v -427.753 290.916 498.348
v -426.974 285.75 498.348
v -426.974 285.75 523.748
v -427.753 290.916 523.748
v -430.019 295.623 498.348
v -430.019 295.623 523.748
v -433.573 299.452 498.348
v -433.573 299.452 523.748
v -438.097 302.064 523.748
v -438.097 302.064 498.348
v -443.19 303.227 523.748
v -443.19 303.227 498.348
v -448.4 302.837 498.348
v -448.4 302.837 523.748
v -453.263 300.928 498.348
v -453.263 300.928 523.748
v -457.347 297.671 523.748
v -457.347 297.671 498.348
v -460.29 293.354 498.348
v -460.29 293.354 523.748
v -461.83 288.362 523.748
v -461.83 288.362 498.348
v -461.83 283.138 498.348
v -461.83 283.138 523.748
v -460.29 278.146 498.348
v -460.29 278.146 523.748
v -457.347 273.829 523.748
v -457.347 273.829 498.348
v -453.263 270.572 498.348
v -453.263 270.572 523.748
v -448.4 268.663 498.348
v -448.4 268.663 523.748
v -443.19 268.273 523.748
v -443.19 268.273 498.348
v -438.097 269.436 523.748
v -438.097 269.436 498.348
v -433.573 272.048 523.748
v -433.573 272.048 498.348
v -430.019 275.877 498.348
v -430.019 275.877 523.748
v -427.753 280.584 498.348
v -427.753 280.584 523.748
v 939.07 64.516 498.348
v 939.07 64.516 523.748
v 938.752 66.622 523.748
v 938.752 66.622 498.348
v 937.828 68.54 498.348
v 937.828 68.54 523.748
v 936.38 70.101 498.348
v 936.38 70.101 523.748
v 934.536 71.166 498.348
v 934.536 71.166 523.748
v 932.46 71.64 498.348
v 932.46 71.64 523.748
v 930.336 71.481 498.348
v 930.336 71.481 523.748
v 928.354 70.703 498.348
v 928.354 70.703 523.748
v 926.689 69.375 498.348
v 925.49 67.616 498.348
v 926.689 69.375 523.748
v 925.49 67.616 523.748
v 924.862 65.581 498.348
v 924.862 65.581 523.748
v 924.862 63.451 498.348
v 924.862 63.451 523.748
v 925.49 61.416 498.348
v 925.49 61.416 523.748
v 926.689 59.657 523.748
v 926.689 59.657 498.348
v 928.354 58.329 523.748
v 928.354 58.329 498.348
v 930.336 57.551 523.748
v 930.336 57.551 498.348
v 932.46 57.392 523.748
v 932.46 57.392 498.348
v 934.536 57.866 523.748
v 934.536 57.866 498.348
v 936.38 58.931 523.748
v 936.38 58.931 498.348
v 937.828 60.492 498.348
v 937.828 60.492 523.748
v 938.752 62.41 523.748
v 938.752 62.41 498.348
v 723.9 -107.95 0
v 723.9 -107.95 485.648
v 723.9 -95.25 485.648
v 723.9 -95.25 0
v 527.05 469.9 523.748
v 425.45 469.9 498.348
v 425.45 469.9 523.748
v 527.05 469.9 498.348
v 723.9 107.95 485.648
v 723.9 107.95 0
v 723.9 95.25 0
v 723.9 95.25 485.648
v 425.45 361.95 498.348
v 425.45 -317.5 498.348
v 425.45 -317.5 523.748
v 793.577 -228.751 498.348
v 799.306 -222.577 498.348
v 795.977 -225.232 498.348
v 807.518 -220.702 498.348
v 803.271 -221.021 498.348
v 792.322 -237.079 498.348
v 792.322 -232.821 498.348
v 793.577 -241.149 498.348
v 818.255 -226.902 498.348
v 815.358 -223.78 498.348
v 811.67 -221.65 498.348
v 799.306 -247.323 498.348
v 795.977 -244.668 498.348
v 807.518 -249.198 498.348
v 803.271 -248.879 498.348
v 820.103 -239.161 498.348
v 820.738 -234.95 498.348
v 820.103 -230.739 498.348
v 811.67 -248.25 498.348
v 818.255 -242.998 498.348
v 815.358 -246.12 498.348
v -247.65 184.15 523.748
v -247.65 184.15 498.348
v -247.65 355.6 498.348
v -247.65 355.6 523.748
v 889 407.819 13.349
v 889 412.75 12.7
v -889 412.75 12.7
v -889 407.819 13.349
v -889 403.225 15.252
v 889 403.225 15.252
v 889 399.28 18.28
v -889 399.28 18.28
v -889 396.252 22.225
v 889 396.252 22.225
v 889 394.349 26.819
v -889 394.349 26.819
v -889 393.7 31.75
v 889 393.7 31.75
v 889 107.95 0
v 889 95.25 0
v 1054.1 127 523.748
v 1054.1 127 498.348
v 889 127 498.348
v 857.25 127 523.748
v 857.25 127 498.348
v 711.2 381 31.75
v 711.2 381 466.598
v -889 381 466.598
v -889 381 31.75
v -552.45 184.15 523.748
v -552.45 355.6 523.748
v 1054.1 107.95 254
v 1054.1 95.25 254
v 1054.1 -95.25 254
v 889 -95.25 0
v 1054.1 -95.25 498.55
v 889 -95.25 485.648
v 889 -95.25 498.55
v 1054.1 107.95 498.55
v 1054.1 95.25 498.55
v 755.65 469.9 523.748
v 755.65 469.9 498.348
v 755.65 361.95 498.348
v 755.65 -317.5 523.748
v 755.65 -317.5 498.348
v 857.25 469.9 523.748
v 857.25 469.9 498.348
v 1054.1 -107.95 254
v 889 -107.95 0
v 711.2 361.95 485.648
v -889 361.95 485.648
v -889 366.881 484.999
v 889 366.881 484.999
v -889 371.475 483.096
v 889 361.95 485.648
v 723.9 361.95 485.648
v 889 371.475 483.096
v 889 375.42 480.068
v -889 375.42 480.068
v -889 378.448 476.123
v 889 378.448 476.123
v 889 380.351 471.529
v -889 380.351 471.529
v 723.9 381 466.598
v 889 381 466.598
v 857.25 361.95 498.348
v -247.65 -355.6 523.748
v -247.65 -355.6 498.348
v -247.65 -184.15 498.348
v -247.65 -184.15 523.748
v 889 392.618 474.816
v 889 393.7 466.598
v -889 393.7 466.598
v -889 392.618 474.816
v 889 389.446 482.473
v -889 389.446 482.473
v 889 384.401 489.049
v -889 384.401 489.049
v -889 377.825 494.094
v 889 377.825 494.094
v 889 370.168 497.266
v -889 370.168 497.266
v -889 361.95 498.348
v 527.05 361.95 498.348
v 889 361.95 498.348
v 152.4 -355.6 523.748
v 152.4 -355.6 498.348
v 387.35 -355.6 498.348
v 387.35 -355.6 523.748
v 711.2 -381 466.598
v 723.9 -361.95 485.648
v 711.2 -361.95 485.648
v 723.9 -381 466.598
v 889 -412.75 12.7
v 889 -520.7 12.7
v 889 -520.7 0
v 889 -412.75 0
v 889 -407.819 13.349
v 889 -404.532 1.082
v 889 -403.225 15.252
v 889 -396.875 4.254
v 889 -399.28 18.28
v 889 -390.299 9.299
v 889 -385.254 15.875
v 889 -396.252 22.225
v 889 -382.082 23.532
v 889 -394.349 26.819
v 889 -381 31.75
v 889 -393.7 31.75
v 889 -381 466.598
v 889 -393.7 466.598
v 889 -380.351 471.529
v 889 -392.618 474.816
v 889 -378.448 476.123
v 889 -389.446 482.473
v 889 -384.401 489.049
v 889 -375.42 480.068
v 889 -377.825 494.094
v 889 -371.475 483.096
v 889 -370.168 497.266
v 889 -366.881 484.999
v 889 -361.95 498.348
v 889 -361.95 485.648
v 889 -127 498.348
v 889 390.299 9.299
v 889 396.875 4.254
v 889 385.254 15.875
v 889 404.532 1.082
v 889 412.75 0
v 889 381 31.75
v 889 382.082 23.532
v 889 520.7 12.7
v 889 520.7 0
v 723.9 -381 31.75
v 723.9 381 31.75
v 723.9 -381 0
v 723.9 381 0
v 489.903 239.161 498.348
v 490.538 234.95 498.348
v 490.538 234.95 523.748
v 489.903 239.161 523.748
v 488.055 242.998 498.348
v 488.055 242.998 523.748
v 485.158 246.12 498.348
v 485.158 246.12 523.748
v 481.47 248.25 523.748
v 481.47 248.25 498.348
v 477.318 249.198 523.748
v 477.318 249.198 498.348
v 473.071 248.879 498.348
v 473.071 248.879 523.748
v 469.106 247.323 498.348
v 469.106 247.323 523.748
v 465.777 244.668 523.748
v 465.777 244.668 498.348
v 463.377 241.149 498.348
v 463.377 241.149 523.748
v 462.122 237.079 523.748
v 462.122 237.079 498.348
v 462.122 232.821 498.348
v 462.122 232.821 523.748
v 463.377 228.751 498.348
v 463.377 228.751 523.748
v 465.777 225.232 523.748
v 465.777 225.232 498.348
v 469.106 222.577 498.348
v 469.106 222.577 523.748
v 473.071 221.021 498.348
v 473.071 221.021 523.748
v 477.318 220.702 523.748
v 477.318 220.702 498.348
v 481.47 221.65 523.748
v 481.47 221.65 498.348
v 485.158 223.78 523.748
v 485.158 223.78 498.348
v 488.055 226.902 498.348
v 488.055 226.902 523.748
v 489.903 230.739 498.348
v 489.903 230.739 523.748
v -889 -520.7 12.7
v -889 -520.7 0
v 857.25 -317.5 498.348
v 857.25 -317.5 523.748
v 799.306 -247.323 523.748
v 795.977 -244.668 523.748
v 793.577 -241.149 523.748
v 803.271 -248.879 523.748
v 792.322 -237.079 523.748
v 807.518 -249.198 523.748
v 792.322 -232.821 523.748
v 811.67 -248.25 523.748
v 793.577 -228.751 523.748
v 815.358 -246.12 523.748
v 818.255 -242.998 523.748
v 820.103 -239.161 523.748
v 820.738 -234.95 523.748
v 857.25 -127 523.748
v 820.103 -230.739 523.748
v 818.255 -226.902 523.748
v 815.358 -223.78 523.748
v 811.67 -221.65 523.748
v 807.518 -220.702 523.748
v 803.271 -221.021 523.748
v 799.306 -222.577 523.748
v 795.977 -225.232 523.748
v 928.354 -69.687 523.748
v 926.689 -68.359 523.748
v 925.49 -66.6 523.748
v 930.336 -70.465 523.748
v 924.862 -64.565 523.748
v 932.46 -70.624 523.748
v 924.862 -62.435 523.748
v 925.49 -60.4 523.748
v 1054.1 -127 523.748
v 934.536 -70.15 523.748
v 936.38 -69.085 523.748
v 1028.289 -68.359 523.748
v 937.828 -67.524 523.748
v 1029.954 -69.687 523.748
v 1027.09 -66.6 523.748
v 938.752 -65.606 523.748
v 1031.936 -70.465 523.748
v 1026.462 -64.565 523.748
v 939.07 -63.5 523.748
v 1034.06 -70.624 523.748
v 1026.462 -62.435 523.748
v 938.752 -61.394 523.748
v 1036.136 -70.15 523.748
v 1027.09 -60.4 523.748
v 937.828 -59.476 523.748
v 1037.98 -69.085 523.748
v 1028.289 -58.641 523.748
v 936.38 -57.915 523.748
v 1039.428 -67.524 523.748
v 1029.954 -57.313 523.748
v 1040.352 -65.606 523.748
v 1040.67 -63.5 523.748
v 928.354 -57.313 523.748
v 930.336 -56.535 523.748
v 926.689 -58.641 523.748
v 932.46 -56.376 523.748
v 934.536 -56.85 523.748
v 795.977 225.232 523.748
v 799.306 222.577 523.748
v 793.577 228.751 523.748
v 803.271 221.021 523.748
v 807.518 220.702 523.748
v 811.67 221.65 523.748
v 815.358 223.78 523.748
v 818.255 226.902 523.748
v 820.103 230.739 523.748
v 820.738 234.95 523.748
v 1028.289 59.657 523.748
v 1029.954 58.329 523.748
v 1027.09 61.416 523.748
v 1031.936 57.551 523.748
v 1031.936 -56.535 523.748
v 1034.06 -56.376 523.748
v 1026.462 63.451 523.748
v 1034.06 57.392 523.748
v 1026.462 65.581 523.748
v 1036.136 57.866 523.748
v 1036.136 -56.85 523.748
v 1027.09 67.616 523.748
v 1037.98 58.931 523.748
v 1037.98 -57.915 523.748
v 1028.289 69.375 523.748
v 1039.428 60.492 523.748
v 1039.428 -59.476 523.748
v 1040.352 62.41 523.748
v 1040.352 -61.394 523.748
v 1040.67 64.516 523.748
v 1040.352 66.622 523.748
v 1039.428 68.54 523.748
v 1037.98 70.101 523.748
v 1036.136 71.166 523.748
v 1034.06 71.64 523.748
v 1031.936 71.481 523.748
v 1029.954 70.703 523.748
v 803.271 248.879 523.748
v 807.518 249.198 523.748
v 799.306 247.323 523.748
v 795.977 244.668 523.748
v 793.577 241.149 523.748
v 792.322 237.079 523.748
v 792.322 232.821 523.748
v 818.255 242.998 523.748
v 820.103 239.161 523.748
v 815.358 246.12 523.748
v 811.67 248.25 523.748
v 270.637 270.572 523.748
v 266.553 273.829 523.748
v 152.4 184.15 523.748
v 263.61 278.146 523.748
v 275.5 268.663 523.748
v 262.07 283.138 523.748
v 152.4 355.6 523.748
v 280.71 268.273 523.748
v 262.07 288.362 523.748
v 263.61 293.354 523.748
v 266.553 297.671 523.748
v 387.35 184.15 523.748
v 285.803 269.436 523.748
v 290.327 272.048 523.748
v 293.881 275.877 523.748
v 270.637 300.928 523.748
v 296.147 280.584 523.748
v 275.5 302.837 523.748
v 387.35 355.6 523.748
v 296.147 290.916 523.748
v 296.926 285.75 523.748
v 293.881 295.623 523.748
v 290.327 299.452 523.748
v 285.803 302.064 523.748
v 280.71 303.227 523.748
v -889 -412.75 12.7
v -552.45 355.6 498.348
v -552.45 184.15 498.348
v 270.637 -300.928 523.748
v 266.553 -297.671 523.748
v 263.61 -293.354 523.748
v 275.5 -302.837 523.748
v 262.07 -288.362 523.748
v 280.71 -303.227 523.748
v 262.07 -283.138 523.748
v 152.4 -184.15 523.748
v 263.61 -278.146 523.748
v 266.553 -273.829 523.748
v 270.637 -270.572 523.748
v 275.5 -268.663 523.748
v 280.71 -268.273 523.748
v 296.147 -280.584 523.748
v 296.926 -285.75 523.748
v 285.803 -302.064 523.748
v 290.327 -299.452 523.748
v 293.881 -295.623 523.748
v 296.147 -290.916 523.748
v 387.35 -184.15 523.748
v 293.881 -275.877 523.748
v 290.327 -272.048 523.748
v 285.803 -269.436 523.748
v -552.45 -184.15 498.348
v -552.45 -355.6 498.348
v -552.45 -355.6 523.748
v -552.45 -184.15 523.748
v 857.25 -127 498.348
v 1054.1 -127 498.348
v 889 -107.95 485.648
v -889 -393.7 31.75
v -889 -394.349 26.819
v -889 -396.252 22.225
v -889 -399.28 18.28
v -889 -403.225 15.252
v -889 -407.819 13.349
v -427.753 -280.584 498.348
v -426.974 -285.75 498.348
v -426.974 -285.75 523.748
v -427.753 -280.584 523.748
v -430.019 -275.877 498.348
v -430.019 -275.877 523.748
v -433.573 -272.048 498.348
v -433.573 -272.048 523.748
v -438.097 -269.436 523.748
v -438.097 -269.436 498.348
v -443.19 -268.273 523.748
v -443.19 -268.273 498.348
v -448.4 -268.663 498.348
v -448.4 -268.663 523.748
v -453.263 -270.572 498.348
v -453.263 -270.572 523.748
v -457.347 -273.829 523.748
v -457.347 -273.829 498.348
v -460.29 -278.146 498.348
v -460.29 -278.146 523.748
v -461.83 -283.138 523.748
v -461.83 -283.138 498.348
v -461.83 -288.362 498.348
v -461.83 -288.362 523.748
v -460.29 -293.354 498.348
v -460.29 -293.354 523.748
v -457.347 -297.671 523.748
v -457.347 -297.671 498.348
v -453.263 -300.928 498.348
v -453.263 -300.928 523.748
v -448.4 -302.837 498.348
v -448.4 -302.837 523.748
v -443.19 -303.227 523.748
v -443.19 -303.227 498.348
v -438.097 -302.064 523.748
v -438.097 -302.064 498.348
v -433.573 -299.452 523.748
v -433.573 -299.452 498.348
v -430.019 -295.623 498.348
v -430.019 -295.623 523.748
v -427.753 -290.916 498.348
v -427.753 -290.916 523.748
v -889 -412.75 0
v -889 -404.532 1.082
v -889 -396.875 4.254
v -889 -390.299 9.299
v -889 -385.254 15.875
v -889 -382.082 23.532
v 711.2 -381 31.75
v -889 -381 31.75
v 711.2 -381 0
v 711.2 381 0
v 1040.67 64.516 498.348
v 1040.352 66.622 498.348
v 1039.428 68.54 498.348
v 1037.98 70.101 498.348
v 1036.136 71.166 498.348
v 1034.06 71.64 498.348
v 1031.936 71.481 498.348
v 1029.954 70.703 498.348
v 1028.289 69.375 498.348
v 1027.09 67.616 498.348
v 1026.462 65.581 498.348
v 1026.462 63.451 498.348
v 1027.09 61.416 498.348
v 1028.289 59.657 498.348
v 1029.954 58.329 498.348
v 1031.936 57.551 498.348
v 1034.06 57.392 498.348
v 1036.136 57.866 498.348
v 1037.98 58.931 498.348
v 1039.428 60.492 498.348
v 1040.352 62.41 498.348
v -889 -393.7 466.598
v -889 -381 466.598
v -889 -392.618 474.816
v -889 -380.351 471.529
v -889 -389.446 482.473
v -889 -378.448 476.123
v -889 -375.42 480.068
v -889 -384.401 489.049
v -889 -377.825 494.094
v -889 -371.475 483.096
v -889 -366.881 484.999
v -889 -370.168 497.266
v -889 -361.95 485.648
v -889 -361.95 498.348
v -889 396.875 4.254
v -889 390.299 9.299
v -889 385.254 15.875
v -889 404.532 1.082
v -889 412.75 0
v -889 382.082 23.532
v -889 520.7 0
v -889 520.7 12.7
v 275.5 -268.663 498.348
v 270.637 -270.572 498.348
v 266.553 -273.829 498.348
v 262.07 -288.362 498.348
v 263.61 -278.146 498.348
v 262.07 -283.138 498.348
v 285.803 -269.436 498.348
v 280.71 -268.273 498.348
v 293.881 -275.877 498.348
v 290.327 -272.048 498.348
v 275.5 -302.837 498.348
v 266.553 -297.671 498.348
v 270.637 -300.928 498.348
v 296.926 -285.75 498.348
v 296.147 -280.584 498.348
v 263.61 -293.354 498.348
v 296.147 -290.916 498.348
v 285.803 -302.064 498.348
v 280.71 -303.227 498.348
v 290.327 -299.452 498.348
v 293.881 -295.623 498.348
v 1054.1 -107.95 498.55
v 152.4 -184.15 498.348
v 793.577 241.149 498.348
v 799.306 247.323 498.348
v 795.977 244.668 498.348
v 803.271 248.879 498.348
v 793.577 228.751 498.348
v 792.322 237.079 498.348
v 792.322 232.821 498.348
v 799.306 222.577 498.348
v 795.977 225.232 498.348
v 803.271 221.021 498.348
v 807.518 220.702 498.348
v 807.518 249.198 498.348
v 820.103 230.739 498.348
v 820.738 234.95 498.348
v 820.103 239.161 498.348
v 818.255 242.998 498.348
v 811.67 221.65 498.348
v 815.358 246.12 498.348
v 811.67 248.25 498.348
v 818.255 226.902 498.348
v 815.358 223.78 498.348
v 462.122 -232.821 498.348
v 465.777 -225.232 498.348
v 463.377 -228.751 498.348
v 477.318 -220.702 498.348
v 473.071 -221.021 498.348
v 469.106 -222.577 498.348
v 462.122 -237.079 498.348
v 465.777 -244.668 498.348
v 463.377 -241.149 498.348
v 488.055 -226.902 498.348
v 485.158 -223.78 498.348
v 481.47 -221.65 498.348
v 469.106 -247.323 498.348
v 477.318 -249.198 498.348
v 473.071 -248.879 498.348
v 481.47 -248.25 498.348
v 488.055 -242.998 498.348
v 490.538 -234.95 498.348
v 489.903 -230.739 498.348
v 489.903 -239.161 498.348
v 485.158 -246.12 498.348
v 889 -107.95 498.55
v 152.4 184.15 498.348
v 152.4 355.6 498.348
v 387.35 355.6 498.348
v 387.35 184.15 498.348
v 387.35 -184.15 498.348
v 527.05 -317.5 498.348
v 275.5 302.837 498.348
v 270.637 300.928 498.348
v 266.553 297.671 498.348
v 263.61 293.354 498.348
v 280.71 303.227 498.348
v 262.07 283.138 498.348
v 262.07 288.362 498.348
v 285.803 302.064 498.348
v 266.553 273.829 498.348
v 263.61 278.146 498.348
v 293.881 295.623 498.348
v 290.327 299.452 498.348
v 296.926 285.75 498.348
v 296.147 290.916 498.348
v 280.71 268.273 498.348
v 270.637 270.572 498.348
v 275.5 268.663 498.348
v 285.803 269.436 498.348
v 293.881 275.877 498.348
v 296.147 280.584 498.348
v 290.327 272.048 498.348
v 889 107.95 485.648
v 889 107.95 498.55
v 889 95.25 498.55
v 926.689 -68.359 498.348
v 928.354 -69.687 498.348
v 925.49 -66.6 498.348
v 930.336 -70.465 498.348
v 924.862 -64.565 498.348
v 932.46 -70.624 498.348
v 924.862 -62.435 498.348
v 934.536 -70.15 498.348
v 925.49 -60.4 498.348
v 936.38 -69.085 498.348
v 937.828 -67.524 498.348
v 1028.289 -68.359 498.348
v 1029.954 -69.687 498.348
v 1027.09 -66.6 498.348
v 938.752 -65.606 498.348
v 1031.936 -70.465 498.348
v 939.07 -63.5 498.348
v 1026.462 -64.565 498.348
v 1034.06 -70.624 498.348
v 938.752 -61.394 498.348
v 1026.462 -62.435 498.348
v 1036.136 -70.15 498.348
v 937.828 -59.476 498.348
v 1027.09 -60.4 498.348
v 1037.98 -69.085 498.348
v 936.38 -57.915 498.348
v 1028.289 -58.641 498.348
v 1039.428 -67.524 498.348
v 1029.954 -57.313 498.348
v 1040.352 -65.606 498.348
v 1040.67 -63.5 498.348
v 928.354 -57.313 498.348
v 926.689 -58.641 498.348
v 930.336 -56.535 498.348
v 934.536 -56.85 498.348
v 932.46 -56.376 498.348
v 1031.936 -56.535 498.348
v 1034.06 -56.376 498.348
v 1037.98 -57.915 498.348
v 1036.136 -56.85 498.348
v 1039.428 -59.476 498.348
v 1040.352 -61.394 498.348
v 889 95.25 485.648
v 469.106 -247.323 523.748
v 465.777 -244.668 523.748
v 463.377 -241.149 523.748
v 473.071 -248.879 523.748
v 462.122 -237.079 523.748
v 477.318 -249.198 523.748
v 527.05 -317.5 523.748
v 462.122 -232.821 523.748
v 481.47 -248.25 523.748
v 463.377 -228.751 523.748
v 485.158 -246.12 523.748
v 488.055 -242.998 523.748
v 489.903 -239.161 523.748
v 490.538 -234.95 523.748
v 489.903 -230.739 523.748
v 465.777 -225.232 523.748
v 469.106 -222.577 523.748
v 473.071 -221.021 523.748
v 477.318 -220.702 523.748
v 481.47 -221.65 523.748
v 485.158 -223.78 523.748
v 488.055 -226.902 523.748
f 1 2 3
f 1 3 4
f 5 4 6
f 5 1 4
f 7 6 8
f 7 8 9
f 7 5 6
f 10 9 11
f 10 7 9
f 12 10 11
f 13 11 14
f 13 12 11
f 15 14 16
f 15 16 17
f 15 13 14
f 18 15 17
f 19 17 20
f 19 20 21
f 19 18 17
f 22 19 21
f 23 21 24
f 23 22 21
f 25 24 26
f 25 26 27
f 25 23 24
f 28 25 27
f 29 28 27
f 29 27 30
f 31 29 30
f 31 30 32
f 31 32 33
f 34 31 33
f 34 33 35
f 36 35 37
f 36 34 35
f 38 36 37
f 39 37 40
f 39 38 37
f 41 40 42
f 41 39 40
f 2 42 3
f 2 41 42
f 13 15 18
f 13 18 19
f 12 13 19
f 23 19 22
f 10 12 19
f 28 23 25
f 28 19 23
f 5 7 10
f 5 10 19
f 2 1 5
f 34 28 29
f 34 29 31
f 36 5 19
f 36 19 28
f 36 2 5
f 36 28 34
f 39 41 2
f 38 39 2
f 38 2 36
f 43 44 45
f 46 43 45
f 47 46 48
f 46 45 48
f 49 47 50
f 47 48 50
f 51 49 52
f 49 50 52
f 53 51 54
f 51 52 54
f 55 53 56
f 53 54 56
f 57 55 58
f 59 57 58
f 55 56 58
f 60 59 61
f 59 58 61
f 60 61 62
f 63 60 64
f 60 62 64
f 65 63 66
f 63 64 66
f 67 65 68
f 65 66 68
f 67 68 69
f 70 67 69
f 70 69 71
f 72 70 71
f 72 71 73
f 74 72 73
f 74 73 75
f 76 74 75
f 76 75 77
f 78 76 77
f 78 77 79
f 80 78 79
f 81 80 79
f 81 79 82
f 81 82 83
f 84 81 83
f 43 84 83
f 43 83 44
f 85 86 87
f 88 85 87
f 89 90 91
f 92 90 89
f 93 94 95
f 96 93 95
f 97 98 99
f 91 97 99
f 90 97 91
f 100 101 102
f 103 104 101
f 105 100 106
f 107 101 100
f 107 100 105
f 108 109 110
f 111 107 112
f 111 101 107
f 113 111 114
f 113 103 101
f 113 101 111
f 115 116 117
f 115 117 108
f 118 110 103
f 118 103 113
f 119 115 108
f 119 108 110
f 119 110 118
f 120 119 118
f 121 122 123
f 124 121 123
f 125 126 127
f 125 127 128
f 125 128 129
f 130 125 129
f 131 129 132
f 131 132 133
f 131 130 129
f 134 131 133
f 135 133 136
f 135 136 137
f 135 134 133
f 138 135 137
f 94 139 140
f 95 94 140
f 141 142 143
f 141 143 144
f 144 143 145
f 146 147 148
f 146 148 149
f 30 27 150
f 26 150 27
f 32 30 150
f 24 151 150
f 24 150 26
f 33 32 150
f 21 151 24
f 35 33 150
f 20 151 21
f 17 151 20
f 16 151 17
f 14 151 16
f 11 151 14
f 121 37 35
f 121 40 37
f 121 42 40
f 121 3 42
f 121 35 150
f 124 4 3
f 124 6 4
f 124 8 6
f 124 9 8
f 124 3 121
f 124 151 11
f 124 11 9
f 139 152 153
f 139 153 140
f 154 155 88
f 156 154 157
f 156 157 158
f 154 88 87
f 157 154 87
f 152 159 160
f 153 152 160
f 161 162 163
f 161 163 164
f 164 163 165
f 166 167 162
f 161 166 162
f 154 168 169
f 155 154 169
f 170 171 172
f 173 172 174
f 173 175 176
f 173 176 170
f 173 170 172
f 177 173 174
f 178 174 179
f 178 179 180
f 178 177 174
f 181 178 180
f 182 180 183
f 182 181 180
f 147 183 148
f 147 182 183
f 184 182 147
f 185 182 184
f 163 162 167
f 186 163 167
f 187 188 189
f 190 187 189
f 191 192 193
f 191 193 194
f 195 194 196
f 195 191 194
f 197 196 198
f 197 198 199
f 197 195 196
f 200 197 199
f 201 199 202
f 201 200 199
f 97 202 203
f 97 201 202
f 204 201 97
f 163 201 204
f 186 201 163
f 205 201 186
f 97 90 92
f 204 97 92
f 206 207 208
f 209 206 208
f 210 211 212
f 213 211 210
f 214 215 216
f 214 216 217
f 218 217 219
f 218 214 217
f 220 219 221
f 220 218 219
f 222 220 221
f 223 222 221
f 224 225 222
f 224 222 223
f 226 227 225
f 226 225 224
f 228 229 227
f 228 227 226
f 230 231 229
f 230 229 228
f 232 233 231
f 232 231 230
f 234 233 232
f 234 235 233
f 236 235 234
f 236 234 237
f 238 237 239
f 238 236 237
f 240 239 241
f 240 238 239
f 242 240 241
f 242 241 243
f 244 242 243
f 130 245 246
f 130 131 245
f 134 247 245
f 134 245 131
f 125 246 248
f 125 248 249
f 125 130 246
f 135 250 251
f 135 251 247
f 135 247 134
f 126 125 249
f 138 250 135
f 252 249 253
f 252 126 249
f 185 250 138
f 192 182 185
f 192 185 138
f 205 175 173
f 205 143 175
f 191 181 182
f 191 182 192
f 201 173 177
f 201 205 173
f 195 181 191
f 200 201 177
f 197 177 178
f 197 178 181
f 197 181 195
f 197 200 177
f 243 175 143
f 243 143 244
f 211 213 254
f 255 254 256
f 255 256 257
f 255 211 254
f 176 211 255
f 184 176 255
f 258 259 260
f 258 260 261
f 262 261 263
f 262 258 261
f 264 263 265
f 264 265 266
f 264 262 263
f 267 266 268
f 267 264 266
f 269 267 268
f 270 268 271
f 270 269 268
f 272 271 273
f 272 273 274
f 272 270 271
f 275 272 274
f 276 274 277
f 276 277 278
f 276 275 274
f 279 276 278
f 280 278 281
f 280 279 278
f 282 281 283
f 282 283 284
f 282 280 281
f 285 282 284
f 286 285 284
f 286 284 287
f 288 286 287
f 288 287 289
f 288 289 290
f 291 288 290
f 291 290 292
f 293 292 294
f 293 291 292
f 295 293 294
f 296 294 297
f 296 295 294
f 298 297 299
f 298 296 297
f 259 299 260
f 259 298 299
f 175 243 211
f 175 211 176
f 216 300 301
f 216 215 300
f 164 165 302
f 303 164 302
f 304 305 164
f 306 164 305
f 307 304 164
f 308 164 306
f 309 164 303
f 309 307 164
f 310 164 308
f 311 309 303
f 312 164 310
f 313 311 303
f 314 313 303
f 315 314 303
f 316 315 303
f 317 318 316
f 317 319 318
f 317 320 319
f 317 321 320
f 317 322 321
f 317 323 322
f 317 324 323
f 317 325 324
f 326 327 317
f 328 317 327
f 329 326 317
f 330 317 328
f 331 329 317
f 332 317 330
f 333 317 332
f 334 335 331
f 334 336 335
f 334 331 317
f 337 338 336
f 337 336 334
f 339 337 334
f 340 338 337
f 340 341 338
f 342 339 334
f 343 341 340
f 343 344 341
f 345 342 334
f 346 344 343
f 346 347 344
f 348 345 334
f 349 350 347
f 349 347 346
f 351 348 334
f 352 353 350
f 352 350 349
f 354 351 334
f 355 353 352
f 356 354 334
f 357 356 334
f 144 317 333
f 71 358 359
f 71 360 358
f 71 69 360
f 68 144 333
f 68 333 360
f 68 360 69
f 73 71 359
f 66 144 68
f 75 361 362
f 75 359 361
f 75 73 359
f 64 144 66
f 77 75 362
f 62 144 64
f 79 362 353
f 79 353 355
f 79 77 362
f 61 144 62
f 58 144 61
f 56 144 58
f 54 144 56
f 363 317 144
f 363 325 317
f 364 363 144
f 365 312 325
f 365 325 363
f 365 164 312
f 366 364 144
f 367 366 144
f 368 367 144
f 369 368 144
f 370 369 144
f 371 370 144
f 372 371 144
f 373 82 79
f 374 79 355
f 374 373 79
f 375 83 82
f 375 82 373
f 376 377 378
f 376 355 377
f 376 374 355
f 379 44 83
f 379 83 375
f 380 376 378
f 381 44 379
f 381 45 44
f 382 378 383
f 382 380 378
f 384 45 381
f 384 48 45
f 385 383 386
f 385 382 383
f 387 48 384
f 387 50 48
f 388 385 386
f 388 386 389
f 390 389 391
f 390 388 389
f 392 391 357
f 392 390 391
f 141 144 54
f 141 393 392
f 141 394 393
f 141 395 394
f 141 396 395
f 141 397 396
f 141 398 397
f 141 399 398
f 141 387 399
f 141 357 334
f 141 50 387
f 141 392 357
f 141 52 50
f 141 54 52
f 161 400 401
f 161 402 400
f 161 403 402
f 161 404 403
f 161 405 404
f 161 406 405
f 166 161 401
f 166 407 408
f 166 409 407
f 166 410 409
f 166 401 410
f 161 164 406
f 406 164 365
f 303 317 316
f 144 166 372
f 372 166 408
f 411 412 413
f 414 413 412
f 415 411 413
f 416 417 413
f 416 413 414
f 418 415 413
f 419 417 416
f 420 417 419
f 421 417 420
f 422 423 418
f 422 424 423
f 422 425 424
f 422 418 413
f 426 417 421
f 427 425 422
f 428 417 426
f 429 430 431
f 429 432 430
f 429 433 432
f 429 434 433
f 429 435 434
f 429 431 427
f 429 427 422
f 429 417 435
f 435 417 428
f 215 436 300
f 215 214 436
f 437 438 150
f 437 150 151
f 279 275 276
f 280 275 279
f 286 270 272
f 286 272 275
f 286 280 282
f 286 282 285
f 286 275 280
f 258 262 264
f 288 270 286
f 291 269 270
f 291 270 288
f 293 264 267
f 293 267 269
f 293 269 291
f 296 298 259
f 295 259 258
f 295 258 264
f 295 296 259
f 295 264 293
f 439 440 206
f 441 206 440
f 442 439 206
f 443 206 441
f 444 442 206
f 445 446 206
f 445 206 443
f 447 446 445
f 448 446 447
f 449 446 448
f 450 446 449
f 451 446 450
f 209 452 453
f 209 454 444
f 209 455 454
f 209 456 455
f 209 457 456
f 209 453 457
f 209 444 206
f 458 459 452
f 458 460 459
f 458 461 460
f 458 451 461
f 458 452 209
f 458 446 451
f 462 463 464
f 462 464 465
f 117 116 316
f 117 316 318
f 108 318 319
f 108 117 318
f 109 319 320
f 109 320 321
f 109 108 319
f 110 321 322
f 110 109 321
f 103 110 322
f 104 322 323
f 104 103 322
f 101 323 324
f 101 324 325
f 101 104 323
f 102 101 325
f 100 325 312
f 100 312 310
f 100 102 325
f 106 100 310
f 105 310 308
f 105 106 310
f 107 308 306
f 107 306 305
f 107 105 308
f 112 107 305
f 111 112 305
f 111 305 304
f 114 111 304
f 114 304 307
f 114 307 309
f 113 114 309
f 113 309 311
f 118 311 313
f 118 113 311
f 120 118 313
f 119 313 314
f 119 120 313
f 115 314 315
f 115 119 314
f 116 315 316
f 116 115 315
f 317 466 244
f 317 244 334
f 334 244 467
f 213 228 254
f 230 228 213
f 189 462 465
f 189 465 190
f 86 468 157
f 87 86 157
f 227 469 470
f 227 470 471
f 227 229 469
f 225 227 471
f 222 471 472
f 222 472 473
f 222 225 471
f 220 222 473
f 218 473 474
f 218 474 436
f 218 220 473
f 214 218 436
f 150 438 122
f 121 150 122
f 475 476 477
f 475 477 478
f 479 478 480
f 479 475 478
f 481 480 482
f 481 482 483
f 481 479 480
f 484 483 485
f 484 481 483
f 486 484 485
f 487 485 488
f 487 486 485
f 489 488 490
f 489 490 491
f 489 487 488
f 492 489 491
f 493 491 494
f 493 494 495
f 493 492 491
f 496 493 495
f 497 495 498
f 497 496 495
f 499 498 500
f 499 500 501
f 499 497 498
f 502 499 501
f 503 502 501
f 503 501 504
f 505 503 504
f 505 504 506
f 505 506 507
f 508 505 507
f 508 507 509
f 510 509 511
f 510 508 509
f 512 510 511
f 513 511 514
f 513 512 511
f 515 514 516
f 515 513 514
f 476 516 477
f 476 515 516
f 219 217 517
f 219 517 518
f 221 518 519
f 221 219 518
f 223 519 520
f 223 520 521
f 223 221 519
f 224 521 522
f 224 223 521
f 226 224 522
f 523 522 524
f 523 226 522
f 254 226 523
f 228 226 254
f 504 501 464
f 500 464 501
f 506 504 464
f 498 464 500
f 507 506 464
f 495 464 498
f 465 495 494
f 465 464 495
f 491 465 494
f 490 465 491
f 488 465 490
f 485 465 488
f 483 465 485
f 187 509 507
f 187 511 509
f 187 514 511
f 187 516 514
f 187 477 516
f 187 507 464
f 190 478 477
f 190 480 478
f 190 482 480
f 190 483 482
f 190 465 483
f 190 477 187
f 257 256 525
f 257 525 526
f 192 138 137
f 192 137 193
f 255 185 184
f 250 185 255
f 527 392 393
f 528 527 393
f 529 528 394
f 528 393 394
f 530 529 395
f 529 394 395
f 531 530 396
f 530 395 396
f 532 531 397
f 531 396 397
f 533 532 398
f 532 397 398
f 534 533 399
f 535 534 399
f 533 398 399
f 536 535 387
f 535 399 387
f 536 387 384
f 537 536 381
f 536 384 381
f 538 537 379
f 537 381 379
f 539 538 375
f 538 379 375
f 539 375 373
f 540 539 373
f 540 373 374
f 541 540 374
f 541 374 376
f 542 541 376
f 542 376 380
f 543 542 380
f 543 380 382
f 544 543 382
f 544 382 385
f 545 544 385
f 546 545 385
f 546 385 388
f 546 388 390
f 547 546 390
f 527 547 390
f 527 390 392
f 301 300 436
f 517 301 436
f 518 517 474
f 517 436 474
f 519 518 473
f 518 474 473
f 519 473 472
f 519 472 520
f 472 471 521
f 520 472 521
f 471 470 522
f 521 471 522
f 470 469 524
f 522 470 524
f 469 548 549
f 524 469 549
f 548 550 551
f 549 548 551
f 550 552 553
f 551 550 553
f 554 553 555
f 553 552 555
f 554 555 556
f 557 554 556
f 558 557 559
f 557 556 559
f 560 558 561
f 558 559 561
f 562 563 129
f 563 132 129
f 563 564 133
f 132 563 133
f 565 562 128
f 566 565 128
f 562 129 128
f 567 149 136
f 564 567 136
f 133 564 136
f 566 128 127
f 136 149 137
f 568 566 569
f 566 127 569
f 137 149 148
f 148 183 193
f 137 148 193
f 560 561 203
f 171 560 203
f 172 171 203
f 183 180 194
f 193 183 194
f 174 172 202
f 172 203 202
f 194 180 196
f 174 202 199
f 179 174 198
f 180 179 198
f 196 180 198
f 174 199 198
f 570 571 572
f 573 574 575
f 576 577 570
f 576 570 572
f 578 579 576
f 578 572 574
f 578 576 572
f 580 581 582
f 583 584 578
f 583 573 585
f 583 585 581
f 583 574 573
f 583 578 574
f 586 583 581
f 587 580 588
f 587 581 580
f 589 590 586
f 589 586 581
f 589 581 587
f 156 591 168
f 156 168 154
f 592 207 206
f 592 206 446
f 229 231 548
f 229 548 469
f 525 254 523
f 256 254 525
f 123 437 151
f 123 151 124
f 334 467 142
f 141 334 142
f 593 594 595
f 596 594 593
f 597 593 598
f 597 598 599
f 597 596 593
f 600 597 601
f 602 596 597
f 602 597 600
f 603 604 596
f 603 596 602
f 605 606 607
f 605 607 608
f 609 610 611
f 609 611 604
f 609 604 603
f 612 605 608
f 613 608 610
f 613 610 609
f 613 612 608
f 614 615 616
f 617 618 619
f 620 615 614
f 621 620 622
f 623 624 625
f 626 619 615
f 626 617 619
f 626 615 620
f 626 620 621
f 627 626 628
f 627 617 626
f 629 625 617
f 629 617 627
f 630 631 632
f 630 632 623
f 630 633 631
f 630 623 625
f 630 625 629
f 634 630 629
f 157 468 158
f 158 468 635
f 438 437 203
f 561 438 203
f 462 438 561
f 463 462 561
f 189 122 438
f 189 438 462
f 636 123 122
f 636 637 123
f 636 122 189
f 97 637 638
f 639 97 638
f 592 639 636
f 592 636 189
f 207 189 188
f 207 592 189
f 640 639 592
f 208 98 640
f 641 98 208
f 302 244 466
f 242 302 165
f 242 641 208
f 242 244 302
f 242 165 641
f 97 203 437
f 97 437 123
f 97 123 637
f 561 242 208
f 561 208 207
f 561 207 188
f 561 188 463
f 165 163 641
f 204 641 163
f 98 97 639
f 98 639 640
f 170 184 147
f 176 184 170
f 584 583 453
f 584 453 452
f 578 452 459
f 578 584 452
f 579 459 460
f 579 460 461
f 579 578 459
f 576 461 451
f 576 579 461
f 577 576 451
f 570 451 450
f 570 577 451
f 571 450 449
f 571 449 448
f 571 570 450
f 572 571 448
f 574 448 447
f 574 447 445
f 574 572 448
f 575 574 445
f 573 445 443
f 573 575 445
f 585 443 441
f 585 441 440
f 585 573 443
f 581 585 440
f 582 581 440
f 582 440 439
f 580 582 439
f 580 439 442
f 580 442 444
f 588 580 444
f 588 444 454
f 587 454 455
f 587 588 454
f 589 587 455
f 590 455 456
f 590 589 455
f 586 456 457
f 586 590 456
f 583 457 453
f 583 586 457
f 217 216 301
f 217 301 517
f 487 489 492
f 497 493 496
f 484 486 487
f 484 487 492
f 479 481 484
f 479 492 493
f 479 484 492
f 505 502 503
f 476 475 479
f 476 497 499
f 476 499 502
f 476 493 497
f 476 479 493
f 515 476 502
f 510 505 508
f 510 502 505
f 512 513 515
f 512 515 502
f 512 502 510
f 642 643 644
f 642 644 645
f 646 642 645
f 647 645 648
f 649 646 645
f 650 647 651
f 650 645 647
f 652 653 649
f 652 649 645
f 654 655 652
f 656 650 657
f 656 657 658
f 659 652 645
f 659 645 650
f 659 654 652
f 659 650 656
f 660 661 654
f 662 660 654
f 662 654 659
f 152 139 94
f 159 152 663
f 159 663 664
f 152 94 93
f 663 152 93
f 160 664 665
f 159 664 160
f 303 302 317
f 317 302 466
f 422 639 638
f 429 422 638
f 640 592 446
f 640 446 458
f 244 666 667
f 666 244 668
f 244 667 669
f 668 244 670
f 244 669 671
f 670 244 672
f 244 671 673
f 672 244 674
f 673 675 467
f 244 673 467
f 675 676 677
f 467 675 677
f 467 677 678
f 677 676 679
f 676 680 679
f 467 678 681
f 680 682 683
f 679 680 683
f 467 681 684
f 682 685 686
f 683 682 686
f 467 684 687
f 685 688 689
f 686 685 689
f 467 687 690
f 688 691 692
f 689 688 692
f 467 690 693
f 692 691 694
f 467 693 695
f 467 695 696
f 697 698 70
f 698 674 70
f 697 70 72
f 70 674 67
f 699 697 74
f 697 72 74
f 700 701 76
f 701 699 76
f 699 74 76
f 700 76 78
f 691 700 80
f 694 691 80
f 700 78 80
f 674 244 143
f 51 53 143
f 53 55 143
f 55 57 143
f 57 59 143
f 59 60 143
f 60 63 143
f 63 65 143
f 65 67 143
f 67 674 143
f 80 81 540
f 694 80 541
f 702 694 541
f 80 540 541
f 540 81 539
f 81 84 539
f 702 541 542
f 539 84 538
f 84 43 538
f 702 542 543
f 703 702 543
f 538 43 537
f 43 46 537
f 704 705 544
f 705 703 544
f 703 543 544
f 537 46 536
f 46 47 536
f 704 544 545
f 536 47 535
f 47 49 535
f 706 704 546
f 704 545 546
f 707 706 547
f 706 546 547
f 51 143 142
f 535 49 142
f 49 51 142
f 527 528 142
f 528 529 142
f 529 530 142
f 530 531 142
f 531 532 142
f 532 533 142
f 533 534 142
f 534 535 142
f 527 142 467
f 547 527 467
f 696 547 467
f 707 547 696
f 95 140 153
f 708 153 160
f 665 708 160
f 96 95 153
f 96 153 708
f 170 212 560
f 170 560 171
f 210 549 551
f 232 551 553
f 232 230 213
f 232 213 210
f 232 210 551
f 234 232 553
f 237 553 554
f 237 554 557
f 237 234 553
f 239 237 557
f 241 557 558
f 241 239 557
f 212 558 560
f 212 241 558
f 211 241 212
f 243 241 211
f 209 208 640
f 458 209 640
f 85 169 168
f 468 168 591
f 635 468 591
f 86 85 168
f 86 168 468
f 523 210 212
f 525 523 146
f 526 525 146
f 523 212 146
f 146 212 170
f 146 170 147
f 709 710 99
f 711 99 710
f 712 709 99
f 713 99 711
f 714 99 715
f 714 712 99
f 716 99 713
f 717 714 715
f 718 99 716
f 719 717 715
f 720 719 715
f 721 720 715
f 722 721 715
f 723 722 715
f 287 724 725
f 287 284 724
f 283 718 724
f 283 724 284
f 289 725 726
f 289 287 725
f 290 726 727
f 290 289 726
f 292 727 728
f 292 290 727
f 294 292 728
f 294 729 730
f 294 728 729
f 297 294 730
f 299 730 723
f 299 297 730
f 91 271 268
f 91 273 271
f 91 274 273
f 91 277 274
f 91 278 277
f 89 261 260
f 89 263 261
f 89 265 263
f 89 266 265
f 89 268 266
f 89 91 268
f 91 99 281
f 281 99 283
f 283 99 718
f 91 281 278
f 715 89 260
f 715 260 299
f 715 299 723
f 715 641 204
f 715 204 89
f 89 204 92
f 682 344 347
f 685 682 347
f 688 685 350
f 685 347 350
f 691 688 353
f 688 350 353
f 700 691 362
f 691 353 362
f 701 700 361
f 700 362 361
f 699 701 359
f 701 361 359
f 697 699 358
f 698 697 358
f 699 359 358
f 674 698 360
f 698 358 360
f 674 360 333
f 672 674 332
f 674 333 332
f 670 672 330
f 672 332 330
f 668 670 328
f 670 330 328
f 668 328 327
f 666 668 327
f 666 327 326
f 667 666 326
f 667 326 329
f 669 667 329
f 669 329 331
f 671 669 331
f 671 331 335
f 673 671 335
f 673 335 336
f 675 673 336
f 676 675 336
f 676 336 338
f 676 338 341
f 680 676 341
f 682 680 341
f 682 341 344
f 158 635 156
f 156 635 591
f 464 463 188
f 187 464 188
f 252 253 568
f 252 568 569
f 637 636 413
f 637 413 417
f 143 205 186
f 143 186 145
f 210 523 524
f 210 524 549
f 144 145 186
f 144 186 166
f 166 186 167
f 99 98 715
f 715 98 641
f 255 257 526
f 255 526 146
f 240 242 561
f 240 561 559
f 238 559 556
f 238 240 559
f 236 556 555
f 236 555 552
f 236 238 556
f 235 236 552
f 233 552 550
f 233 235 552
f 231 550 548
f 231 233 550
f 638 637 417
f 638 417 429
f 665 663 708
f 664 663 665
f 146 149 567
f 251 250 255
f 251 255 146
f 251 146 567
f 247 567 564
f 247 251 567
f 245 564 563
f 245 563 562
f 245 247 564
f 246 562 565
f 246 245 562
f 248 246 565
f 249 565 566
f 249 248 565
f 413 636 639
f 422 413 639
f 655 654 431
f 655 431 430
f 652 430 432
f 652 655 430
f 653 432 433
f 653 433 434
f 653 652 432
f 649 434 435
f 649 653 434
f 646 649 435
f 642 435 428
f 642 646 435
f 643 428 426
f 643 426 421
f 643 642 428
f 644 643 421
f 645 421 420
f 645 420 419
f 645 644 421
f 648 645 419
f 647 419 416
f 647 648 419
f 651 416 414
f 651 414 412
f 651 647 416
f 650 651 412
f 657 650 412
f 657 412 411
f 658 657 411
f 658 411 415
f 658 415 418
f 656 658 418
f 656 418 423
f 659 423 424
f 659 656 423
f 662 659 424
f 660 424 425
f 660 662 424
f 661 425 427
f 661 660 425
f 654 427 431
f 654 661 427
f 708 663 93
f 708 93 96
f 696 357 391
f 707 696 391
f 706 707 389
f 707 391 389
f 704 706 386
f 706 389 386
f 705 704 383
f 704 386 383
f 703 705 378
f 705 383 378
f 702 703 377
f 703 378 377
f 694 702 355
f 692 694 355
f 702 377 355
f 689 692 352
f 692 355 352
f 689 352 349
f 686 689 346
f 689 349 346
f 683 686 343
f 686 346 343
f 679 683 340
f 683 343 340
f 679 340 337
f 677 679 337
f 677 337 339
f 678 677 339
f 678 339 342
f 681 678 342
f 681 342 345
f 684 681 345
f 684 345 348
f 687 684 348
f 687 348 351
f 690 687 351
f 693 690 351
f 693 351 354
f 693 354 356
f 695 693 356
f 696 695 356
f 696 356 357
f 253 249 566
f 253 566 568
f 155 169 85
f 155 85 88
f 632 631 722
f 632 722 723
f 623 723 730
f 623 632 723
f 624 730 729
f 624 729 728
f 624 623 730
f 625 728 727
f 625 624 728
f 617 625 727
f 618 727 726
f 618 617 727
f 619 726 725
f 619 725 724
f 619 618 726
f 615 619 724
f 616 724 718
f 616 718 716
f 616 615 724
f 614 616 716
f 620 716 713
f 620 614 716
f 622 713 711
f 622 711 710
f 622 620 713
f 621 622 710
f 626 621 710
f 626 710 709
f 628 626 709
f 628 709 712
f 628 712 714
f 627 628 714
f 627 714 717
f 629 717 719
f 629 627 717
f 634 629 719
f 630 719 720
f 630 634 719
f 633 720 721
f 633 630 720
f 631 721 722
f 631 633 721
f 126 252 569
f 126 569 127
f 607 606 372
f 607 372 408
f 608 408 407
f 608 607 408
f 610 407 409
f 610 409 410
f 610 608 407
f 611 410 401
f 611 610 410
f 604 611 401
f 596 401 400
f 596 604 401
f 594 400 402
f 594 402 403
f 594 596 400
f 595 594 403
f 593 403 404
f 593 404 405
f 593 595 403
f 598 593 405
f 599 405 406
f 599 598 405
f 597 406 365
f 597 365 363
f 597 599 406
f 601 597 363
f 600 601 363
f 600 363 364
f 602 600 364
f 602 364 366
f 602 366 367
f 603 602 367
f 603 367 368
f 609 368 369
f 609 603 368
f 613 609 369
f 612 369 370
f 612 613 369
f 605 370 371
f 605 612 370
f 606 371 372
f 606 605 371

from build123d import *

# Parameters (mm, degrees)
F1_DEPTH  = 889
F2_W      = 101.6
F2_H      = 787.4
F2_R      = 14.2875
F3_DEPTH  = 25.4
F4_R      = 7.14375
F5_DEPTH  = 523.749
F8_DEPTH  = 12.7
F9_W      = 12.7
F9_H      = 485.648
F10_DEPTH = 330.2
F11_W     = 165.0999999996
F11_H     = 12.9023852367
F12_DEPTH = 12.7
F15_DEPTH = 628.651
F17_W     = 304.8
F17_H     = 171.45
F17_R     = 17.526
F17_W_2   = 234.95
F18_DEPTH = 25.4


with BuildPart() as f1:
    # F0 (on Right) → F1 (new body, symmetric)
    with BuildSketch(Plane.YZ):
        with BuildLine():
            Line((-520.7, 12.7), (-520.7, 0))
            Line((-520.7, 0), (-412.75, 0))
            ThreePointArc((-412.75, 0), (-390.2993596973, 9.2993596973), (-381, 31.75))
            Line((-381, 31.75), (-381, 466.598))
            ThreePointArc((-381, 466.598), (-375.4203841816, 480.0683841816), (-361.95, 485.648))
            Line((-361.95, 485.648), (0, 485.648))
            Line((0, 485.648), (361.95, 485.648))
            ThreePointArc((361.95, 485.648), (375.4203841816, 480.0683841816), (381, 466.598))
            Line((381, 466.598), (381, 31.75))
            ThreePointArc((381, 31.75), (390.2993596973, 9.2993596973), (412.75, 0))
            Line((412.75, 0), (520.7, 0))
            Line((520.7, 0), (520.7, 12.7))
            Line((520.7, 12.7), (412.75, 12.7))
            ThreePointArc((412.75, 12.7), (399.2796158184, 18.2796158184), (393.7, 31.75))
            Line((393.7, 31.75), (393.7, 466.598))
            ThreePointArc((393.7, 466.598), (384.4006403027, 489.0486403027), (361.95, 498.348))
            Line((361.95, 498.348), (0, 498.348))
            Line((0, 498.348), (-361.95, 498.348))
            ThreePointArc((-361.95, 498.348), (-384.4006403027, 489.0486403027), (-393.7, 466.598))
            Line((-393.7, 466.598), (-393.7, 31.75))
            ThreePointArc((-393.7, 31.75), (-399.2796158184, 18.2796158184), (-412.75, 12.7))
            Line((-412.75, 12.7), (-520.7, 12.7))
        make_face()
    extrude(amount=F1_DEPTH, both=True)

    # F2 (on face) → F3 (join)
    with BuildSketch(Plane.XY.offset(498.348)):
        with Locations((476.25, 76.2)):
            Rectangle(F2_W, F2_H)
        with Locations((476.25, -234.95)):
            Circle(F2_R, mode=Mode.SUBTRACT)
        with Locations((476.25, 234.95)):
            Circle(F2_R, mode=Mode.SUBTRACT)
        Polygon((857.25, 469.9), (755.65, 469.9), (755.65, -317.5), (857.25, -317.5), (857.25, -127), (1054.1, -127), (1054.1, 127), (857.25, 127), align=None)
        with Locations((806.45, -234.95)):
            Circle(F2_R, mode=Mode.SUBTRACT)
        with Locations((806.45, 234.95)):
            Circle(F2_R, mode=Mode.SUBTRACT)
    extrude(amount=F3_DEPTH)

    # F4 (on face) → F5 (cut, through all)
    with BuildSketch(Plane.XY.offset(523.748)):
        with Locations((931.926, 64.516)):
            Circle(F4_R)
        with Locations((1033.526, 64.516)):
            Circle(F4_R)
        with Locations((1033.526, -63.5)):
            Circle(F4_R)
        with Locations((931.926, -63.5)):
            Circle(F4_R)
    extrude(amount=-F5_DEPTH, mode=Mode.SUBTRACT)

    # F7 (on offset) → F8 (join)
    with BuildSketch(Plane.YZ.offset(723.9)):
        Polygon((361.95, 485.648), (-361.95, 485.648), (-381, 466.598), (-381, 0), (381, 0), (381, 466.598), align=None)
    extrude(amount=-F8_DEPTH)

    # F17 (on face) → F18 (join)
    with BuildSketch(Plane.XY.offset(498.348)):
        with Locations((-400.05, 269.875)):
            Rectangle(F17_W, F17_H)
        with Locations((-444.5, 285.75)):
            Circle(F17_R, mode=Mode.SUBTRACT)
        with Locations((269.875, 269.875)):
            Rectangle(F17_W_2, F17_H)
        with Locations((279.4, 285.75)):
            Circle(F17_R, mode=Mode.SUBTRACT)
        with Locations((269.875, -269.875)):
            Rectangle(F17_W_2, F17_H)
        with Locations((279.4, -285.75)):
            Circle(F17_R, mode=Mode.SUBTRACT)
        with Locations((-400.05, -269.875)):
            Rectangle(F17_W, F17_H)
        with Locations((-444.5, -285.75)):
            Circle(F17_R, mode=Mode.SUBTRACT)
    extrude(amount=F18_DEPTH)


with BuildPart() as f10:
    # F9 (on face) → F10 (new body, through all)
    with BuildSketch(Plane.YZ.offset(723.9)):
        with Locations((-101.6, 242.824)):
            Rectangle(F9_W, F9_H)
    extrude(amount=F10_DEPTH)


with BuildPart() as f12:
    # F11 (on face) → F12 (new body)
    with BuildSketch(Plane.XZ.offset(107.95)):
        with Locations((971.5500000003, 492.0991926184)):
            Rectangle(F11_W, F11_H)
    extrude(amount=-F12_DEPTH)

    # F13: union F10
    add(f10.part)

    # F14 (on face) → F15 (cut, through all)
    with BuildSketch(Plane.XZ.offset(107.95)):
        Polygon((1054.1000000005, 0), (1054.1000000007, 254), (889, 0), align=None)
    extrude(amount=-F15_DEPTH, mode=Mode.SUBTRACT)


with BuildPart() as f16_1:
    # F16: instance of F12
    add(f12.part.mirror(Plane.XZ))


solid = Compound([f1.part, f12.part, f16_1.part])
